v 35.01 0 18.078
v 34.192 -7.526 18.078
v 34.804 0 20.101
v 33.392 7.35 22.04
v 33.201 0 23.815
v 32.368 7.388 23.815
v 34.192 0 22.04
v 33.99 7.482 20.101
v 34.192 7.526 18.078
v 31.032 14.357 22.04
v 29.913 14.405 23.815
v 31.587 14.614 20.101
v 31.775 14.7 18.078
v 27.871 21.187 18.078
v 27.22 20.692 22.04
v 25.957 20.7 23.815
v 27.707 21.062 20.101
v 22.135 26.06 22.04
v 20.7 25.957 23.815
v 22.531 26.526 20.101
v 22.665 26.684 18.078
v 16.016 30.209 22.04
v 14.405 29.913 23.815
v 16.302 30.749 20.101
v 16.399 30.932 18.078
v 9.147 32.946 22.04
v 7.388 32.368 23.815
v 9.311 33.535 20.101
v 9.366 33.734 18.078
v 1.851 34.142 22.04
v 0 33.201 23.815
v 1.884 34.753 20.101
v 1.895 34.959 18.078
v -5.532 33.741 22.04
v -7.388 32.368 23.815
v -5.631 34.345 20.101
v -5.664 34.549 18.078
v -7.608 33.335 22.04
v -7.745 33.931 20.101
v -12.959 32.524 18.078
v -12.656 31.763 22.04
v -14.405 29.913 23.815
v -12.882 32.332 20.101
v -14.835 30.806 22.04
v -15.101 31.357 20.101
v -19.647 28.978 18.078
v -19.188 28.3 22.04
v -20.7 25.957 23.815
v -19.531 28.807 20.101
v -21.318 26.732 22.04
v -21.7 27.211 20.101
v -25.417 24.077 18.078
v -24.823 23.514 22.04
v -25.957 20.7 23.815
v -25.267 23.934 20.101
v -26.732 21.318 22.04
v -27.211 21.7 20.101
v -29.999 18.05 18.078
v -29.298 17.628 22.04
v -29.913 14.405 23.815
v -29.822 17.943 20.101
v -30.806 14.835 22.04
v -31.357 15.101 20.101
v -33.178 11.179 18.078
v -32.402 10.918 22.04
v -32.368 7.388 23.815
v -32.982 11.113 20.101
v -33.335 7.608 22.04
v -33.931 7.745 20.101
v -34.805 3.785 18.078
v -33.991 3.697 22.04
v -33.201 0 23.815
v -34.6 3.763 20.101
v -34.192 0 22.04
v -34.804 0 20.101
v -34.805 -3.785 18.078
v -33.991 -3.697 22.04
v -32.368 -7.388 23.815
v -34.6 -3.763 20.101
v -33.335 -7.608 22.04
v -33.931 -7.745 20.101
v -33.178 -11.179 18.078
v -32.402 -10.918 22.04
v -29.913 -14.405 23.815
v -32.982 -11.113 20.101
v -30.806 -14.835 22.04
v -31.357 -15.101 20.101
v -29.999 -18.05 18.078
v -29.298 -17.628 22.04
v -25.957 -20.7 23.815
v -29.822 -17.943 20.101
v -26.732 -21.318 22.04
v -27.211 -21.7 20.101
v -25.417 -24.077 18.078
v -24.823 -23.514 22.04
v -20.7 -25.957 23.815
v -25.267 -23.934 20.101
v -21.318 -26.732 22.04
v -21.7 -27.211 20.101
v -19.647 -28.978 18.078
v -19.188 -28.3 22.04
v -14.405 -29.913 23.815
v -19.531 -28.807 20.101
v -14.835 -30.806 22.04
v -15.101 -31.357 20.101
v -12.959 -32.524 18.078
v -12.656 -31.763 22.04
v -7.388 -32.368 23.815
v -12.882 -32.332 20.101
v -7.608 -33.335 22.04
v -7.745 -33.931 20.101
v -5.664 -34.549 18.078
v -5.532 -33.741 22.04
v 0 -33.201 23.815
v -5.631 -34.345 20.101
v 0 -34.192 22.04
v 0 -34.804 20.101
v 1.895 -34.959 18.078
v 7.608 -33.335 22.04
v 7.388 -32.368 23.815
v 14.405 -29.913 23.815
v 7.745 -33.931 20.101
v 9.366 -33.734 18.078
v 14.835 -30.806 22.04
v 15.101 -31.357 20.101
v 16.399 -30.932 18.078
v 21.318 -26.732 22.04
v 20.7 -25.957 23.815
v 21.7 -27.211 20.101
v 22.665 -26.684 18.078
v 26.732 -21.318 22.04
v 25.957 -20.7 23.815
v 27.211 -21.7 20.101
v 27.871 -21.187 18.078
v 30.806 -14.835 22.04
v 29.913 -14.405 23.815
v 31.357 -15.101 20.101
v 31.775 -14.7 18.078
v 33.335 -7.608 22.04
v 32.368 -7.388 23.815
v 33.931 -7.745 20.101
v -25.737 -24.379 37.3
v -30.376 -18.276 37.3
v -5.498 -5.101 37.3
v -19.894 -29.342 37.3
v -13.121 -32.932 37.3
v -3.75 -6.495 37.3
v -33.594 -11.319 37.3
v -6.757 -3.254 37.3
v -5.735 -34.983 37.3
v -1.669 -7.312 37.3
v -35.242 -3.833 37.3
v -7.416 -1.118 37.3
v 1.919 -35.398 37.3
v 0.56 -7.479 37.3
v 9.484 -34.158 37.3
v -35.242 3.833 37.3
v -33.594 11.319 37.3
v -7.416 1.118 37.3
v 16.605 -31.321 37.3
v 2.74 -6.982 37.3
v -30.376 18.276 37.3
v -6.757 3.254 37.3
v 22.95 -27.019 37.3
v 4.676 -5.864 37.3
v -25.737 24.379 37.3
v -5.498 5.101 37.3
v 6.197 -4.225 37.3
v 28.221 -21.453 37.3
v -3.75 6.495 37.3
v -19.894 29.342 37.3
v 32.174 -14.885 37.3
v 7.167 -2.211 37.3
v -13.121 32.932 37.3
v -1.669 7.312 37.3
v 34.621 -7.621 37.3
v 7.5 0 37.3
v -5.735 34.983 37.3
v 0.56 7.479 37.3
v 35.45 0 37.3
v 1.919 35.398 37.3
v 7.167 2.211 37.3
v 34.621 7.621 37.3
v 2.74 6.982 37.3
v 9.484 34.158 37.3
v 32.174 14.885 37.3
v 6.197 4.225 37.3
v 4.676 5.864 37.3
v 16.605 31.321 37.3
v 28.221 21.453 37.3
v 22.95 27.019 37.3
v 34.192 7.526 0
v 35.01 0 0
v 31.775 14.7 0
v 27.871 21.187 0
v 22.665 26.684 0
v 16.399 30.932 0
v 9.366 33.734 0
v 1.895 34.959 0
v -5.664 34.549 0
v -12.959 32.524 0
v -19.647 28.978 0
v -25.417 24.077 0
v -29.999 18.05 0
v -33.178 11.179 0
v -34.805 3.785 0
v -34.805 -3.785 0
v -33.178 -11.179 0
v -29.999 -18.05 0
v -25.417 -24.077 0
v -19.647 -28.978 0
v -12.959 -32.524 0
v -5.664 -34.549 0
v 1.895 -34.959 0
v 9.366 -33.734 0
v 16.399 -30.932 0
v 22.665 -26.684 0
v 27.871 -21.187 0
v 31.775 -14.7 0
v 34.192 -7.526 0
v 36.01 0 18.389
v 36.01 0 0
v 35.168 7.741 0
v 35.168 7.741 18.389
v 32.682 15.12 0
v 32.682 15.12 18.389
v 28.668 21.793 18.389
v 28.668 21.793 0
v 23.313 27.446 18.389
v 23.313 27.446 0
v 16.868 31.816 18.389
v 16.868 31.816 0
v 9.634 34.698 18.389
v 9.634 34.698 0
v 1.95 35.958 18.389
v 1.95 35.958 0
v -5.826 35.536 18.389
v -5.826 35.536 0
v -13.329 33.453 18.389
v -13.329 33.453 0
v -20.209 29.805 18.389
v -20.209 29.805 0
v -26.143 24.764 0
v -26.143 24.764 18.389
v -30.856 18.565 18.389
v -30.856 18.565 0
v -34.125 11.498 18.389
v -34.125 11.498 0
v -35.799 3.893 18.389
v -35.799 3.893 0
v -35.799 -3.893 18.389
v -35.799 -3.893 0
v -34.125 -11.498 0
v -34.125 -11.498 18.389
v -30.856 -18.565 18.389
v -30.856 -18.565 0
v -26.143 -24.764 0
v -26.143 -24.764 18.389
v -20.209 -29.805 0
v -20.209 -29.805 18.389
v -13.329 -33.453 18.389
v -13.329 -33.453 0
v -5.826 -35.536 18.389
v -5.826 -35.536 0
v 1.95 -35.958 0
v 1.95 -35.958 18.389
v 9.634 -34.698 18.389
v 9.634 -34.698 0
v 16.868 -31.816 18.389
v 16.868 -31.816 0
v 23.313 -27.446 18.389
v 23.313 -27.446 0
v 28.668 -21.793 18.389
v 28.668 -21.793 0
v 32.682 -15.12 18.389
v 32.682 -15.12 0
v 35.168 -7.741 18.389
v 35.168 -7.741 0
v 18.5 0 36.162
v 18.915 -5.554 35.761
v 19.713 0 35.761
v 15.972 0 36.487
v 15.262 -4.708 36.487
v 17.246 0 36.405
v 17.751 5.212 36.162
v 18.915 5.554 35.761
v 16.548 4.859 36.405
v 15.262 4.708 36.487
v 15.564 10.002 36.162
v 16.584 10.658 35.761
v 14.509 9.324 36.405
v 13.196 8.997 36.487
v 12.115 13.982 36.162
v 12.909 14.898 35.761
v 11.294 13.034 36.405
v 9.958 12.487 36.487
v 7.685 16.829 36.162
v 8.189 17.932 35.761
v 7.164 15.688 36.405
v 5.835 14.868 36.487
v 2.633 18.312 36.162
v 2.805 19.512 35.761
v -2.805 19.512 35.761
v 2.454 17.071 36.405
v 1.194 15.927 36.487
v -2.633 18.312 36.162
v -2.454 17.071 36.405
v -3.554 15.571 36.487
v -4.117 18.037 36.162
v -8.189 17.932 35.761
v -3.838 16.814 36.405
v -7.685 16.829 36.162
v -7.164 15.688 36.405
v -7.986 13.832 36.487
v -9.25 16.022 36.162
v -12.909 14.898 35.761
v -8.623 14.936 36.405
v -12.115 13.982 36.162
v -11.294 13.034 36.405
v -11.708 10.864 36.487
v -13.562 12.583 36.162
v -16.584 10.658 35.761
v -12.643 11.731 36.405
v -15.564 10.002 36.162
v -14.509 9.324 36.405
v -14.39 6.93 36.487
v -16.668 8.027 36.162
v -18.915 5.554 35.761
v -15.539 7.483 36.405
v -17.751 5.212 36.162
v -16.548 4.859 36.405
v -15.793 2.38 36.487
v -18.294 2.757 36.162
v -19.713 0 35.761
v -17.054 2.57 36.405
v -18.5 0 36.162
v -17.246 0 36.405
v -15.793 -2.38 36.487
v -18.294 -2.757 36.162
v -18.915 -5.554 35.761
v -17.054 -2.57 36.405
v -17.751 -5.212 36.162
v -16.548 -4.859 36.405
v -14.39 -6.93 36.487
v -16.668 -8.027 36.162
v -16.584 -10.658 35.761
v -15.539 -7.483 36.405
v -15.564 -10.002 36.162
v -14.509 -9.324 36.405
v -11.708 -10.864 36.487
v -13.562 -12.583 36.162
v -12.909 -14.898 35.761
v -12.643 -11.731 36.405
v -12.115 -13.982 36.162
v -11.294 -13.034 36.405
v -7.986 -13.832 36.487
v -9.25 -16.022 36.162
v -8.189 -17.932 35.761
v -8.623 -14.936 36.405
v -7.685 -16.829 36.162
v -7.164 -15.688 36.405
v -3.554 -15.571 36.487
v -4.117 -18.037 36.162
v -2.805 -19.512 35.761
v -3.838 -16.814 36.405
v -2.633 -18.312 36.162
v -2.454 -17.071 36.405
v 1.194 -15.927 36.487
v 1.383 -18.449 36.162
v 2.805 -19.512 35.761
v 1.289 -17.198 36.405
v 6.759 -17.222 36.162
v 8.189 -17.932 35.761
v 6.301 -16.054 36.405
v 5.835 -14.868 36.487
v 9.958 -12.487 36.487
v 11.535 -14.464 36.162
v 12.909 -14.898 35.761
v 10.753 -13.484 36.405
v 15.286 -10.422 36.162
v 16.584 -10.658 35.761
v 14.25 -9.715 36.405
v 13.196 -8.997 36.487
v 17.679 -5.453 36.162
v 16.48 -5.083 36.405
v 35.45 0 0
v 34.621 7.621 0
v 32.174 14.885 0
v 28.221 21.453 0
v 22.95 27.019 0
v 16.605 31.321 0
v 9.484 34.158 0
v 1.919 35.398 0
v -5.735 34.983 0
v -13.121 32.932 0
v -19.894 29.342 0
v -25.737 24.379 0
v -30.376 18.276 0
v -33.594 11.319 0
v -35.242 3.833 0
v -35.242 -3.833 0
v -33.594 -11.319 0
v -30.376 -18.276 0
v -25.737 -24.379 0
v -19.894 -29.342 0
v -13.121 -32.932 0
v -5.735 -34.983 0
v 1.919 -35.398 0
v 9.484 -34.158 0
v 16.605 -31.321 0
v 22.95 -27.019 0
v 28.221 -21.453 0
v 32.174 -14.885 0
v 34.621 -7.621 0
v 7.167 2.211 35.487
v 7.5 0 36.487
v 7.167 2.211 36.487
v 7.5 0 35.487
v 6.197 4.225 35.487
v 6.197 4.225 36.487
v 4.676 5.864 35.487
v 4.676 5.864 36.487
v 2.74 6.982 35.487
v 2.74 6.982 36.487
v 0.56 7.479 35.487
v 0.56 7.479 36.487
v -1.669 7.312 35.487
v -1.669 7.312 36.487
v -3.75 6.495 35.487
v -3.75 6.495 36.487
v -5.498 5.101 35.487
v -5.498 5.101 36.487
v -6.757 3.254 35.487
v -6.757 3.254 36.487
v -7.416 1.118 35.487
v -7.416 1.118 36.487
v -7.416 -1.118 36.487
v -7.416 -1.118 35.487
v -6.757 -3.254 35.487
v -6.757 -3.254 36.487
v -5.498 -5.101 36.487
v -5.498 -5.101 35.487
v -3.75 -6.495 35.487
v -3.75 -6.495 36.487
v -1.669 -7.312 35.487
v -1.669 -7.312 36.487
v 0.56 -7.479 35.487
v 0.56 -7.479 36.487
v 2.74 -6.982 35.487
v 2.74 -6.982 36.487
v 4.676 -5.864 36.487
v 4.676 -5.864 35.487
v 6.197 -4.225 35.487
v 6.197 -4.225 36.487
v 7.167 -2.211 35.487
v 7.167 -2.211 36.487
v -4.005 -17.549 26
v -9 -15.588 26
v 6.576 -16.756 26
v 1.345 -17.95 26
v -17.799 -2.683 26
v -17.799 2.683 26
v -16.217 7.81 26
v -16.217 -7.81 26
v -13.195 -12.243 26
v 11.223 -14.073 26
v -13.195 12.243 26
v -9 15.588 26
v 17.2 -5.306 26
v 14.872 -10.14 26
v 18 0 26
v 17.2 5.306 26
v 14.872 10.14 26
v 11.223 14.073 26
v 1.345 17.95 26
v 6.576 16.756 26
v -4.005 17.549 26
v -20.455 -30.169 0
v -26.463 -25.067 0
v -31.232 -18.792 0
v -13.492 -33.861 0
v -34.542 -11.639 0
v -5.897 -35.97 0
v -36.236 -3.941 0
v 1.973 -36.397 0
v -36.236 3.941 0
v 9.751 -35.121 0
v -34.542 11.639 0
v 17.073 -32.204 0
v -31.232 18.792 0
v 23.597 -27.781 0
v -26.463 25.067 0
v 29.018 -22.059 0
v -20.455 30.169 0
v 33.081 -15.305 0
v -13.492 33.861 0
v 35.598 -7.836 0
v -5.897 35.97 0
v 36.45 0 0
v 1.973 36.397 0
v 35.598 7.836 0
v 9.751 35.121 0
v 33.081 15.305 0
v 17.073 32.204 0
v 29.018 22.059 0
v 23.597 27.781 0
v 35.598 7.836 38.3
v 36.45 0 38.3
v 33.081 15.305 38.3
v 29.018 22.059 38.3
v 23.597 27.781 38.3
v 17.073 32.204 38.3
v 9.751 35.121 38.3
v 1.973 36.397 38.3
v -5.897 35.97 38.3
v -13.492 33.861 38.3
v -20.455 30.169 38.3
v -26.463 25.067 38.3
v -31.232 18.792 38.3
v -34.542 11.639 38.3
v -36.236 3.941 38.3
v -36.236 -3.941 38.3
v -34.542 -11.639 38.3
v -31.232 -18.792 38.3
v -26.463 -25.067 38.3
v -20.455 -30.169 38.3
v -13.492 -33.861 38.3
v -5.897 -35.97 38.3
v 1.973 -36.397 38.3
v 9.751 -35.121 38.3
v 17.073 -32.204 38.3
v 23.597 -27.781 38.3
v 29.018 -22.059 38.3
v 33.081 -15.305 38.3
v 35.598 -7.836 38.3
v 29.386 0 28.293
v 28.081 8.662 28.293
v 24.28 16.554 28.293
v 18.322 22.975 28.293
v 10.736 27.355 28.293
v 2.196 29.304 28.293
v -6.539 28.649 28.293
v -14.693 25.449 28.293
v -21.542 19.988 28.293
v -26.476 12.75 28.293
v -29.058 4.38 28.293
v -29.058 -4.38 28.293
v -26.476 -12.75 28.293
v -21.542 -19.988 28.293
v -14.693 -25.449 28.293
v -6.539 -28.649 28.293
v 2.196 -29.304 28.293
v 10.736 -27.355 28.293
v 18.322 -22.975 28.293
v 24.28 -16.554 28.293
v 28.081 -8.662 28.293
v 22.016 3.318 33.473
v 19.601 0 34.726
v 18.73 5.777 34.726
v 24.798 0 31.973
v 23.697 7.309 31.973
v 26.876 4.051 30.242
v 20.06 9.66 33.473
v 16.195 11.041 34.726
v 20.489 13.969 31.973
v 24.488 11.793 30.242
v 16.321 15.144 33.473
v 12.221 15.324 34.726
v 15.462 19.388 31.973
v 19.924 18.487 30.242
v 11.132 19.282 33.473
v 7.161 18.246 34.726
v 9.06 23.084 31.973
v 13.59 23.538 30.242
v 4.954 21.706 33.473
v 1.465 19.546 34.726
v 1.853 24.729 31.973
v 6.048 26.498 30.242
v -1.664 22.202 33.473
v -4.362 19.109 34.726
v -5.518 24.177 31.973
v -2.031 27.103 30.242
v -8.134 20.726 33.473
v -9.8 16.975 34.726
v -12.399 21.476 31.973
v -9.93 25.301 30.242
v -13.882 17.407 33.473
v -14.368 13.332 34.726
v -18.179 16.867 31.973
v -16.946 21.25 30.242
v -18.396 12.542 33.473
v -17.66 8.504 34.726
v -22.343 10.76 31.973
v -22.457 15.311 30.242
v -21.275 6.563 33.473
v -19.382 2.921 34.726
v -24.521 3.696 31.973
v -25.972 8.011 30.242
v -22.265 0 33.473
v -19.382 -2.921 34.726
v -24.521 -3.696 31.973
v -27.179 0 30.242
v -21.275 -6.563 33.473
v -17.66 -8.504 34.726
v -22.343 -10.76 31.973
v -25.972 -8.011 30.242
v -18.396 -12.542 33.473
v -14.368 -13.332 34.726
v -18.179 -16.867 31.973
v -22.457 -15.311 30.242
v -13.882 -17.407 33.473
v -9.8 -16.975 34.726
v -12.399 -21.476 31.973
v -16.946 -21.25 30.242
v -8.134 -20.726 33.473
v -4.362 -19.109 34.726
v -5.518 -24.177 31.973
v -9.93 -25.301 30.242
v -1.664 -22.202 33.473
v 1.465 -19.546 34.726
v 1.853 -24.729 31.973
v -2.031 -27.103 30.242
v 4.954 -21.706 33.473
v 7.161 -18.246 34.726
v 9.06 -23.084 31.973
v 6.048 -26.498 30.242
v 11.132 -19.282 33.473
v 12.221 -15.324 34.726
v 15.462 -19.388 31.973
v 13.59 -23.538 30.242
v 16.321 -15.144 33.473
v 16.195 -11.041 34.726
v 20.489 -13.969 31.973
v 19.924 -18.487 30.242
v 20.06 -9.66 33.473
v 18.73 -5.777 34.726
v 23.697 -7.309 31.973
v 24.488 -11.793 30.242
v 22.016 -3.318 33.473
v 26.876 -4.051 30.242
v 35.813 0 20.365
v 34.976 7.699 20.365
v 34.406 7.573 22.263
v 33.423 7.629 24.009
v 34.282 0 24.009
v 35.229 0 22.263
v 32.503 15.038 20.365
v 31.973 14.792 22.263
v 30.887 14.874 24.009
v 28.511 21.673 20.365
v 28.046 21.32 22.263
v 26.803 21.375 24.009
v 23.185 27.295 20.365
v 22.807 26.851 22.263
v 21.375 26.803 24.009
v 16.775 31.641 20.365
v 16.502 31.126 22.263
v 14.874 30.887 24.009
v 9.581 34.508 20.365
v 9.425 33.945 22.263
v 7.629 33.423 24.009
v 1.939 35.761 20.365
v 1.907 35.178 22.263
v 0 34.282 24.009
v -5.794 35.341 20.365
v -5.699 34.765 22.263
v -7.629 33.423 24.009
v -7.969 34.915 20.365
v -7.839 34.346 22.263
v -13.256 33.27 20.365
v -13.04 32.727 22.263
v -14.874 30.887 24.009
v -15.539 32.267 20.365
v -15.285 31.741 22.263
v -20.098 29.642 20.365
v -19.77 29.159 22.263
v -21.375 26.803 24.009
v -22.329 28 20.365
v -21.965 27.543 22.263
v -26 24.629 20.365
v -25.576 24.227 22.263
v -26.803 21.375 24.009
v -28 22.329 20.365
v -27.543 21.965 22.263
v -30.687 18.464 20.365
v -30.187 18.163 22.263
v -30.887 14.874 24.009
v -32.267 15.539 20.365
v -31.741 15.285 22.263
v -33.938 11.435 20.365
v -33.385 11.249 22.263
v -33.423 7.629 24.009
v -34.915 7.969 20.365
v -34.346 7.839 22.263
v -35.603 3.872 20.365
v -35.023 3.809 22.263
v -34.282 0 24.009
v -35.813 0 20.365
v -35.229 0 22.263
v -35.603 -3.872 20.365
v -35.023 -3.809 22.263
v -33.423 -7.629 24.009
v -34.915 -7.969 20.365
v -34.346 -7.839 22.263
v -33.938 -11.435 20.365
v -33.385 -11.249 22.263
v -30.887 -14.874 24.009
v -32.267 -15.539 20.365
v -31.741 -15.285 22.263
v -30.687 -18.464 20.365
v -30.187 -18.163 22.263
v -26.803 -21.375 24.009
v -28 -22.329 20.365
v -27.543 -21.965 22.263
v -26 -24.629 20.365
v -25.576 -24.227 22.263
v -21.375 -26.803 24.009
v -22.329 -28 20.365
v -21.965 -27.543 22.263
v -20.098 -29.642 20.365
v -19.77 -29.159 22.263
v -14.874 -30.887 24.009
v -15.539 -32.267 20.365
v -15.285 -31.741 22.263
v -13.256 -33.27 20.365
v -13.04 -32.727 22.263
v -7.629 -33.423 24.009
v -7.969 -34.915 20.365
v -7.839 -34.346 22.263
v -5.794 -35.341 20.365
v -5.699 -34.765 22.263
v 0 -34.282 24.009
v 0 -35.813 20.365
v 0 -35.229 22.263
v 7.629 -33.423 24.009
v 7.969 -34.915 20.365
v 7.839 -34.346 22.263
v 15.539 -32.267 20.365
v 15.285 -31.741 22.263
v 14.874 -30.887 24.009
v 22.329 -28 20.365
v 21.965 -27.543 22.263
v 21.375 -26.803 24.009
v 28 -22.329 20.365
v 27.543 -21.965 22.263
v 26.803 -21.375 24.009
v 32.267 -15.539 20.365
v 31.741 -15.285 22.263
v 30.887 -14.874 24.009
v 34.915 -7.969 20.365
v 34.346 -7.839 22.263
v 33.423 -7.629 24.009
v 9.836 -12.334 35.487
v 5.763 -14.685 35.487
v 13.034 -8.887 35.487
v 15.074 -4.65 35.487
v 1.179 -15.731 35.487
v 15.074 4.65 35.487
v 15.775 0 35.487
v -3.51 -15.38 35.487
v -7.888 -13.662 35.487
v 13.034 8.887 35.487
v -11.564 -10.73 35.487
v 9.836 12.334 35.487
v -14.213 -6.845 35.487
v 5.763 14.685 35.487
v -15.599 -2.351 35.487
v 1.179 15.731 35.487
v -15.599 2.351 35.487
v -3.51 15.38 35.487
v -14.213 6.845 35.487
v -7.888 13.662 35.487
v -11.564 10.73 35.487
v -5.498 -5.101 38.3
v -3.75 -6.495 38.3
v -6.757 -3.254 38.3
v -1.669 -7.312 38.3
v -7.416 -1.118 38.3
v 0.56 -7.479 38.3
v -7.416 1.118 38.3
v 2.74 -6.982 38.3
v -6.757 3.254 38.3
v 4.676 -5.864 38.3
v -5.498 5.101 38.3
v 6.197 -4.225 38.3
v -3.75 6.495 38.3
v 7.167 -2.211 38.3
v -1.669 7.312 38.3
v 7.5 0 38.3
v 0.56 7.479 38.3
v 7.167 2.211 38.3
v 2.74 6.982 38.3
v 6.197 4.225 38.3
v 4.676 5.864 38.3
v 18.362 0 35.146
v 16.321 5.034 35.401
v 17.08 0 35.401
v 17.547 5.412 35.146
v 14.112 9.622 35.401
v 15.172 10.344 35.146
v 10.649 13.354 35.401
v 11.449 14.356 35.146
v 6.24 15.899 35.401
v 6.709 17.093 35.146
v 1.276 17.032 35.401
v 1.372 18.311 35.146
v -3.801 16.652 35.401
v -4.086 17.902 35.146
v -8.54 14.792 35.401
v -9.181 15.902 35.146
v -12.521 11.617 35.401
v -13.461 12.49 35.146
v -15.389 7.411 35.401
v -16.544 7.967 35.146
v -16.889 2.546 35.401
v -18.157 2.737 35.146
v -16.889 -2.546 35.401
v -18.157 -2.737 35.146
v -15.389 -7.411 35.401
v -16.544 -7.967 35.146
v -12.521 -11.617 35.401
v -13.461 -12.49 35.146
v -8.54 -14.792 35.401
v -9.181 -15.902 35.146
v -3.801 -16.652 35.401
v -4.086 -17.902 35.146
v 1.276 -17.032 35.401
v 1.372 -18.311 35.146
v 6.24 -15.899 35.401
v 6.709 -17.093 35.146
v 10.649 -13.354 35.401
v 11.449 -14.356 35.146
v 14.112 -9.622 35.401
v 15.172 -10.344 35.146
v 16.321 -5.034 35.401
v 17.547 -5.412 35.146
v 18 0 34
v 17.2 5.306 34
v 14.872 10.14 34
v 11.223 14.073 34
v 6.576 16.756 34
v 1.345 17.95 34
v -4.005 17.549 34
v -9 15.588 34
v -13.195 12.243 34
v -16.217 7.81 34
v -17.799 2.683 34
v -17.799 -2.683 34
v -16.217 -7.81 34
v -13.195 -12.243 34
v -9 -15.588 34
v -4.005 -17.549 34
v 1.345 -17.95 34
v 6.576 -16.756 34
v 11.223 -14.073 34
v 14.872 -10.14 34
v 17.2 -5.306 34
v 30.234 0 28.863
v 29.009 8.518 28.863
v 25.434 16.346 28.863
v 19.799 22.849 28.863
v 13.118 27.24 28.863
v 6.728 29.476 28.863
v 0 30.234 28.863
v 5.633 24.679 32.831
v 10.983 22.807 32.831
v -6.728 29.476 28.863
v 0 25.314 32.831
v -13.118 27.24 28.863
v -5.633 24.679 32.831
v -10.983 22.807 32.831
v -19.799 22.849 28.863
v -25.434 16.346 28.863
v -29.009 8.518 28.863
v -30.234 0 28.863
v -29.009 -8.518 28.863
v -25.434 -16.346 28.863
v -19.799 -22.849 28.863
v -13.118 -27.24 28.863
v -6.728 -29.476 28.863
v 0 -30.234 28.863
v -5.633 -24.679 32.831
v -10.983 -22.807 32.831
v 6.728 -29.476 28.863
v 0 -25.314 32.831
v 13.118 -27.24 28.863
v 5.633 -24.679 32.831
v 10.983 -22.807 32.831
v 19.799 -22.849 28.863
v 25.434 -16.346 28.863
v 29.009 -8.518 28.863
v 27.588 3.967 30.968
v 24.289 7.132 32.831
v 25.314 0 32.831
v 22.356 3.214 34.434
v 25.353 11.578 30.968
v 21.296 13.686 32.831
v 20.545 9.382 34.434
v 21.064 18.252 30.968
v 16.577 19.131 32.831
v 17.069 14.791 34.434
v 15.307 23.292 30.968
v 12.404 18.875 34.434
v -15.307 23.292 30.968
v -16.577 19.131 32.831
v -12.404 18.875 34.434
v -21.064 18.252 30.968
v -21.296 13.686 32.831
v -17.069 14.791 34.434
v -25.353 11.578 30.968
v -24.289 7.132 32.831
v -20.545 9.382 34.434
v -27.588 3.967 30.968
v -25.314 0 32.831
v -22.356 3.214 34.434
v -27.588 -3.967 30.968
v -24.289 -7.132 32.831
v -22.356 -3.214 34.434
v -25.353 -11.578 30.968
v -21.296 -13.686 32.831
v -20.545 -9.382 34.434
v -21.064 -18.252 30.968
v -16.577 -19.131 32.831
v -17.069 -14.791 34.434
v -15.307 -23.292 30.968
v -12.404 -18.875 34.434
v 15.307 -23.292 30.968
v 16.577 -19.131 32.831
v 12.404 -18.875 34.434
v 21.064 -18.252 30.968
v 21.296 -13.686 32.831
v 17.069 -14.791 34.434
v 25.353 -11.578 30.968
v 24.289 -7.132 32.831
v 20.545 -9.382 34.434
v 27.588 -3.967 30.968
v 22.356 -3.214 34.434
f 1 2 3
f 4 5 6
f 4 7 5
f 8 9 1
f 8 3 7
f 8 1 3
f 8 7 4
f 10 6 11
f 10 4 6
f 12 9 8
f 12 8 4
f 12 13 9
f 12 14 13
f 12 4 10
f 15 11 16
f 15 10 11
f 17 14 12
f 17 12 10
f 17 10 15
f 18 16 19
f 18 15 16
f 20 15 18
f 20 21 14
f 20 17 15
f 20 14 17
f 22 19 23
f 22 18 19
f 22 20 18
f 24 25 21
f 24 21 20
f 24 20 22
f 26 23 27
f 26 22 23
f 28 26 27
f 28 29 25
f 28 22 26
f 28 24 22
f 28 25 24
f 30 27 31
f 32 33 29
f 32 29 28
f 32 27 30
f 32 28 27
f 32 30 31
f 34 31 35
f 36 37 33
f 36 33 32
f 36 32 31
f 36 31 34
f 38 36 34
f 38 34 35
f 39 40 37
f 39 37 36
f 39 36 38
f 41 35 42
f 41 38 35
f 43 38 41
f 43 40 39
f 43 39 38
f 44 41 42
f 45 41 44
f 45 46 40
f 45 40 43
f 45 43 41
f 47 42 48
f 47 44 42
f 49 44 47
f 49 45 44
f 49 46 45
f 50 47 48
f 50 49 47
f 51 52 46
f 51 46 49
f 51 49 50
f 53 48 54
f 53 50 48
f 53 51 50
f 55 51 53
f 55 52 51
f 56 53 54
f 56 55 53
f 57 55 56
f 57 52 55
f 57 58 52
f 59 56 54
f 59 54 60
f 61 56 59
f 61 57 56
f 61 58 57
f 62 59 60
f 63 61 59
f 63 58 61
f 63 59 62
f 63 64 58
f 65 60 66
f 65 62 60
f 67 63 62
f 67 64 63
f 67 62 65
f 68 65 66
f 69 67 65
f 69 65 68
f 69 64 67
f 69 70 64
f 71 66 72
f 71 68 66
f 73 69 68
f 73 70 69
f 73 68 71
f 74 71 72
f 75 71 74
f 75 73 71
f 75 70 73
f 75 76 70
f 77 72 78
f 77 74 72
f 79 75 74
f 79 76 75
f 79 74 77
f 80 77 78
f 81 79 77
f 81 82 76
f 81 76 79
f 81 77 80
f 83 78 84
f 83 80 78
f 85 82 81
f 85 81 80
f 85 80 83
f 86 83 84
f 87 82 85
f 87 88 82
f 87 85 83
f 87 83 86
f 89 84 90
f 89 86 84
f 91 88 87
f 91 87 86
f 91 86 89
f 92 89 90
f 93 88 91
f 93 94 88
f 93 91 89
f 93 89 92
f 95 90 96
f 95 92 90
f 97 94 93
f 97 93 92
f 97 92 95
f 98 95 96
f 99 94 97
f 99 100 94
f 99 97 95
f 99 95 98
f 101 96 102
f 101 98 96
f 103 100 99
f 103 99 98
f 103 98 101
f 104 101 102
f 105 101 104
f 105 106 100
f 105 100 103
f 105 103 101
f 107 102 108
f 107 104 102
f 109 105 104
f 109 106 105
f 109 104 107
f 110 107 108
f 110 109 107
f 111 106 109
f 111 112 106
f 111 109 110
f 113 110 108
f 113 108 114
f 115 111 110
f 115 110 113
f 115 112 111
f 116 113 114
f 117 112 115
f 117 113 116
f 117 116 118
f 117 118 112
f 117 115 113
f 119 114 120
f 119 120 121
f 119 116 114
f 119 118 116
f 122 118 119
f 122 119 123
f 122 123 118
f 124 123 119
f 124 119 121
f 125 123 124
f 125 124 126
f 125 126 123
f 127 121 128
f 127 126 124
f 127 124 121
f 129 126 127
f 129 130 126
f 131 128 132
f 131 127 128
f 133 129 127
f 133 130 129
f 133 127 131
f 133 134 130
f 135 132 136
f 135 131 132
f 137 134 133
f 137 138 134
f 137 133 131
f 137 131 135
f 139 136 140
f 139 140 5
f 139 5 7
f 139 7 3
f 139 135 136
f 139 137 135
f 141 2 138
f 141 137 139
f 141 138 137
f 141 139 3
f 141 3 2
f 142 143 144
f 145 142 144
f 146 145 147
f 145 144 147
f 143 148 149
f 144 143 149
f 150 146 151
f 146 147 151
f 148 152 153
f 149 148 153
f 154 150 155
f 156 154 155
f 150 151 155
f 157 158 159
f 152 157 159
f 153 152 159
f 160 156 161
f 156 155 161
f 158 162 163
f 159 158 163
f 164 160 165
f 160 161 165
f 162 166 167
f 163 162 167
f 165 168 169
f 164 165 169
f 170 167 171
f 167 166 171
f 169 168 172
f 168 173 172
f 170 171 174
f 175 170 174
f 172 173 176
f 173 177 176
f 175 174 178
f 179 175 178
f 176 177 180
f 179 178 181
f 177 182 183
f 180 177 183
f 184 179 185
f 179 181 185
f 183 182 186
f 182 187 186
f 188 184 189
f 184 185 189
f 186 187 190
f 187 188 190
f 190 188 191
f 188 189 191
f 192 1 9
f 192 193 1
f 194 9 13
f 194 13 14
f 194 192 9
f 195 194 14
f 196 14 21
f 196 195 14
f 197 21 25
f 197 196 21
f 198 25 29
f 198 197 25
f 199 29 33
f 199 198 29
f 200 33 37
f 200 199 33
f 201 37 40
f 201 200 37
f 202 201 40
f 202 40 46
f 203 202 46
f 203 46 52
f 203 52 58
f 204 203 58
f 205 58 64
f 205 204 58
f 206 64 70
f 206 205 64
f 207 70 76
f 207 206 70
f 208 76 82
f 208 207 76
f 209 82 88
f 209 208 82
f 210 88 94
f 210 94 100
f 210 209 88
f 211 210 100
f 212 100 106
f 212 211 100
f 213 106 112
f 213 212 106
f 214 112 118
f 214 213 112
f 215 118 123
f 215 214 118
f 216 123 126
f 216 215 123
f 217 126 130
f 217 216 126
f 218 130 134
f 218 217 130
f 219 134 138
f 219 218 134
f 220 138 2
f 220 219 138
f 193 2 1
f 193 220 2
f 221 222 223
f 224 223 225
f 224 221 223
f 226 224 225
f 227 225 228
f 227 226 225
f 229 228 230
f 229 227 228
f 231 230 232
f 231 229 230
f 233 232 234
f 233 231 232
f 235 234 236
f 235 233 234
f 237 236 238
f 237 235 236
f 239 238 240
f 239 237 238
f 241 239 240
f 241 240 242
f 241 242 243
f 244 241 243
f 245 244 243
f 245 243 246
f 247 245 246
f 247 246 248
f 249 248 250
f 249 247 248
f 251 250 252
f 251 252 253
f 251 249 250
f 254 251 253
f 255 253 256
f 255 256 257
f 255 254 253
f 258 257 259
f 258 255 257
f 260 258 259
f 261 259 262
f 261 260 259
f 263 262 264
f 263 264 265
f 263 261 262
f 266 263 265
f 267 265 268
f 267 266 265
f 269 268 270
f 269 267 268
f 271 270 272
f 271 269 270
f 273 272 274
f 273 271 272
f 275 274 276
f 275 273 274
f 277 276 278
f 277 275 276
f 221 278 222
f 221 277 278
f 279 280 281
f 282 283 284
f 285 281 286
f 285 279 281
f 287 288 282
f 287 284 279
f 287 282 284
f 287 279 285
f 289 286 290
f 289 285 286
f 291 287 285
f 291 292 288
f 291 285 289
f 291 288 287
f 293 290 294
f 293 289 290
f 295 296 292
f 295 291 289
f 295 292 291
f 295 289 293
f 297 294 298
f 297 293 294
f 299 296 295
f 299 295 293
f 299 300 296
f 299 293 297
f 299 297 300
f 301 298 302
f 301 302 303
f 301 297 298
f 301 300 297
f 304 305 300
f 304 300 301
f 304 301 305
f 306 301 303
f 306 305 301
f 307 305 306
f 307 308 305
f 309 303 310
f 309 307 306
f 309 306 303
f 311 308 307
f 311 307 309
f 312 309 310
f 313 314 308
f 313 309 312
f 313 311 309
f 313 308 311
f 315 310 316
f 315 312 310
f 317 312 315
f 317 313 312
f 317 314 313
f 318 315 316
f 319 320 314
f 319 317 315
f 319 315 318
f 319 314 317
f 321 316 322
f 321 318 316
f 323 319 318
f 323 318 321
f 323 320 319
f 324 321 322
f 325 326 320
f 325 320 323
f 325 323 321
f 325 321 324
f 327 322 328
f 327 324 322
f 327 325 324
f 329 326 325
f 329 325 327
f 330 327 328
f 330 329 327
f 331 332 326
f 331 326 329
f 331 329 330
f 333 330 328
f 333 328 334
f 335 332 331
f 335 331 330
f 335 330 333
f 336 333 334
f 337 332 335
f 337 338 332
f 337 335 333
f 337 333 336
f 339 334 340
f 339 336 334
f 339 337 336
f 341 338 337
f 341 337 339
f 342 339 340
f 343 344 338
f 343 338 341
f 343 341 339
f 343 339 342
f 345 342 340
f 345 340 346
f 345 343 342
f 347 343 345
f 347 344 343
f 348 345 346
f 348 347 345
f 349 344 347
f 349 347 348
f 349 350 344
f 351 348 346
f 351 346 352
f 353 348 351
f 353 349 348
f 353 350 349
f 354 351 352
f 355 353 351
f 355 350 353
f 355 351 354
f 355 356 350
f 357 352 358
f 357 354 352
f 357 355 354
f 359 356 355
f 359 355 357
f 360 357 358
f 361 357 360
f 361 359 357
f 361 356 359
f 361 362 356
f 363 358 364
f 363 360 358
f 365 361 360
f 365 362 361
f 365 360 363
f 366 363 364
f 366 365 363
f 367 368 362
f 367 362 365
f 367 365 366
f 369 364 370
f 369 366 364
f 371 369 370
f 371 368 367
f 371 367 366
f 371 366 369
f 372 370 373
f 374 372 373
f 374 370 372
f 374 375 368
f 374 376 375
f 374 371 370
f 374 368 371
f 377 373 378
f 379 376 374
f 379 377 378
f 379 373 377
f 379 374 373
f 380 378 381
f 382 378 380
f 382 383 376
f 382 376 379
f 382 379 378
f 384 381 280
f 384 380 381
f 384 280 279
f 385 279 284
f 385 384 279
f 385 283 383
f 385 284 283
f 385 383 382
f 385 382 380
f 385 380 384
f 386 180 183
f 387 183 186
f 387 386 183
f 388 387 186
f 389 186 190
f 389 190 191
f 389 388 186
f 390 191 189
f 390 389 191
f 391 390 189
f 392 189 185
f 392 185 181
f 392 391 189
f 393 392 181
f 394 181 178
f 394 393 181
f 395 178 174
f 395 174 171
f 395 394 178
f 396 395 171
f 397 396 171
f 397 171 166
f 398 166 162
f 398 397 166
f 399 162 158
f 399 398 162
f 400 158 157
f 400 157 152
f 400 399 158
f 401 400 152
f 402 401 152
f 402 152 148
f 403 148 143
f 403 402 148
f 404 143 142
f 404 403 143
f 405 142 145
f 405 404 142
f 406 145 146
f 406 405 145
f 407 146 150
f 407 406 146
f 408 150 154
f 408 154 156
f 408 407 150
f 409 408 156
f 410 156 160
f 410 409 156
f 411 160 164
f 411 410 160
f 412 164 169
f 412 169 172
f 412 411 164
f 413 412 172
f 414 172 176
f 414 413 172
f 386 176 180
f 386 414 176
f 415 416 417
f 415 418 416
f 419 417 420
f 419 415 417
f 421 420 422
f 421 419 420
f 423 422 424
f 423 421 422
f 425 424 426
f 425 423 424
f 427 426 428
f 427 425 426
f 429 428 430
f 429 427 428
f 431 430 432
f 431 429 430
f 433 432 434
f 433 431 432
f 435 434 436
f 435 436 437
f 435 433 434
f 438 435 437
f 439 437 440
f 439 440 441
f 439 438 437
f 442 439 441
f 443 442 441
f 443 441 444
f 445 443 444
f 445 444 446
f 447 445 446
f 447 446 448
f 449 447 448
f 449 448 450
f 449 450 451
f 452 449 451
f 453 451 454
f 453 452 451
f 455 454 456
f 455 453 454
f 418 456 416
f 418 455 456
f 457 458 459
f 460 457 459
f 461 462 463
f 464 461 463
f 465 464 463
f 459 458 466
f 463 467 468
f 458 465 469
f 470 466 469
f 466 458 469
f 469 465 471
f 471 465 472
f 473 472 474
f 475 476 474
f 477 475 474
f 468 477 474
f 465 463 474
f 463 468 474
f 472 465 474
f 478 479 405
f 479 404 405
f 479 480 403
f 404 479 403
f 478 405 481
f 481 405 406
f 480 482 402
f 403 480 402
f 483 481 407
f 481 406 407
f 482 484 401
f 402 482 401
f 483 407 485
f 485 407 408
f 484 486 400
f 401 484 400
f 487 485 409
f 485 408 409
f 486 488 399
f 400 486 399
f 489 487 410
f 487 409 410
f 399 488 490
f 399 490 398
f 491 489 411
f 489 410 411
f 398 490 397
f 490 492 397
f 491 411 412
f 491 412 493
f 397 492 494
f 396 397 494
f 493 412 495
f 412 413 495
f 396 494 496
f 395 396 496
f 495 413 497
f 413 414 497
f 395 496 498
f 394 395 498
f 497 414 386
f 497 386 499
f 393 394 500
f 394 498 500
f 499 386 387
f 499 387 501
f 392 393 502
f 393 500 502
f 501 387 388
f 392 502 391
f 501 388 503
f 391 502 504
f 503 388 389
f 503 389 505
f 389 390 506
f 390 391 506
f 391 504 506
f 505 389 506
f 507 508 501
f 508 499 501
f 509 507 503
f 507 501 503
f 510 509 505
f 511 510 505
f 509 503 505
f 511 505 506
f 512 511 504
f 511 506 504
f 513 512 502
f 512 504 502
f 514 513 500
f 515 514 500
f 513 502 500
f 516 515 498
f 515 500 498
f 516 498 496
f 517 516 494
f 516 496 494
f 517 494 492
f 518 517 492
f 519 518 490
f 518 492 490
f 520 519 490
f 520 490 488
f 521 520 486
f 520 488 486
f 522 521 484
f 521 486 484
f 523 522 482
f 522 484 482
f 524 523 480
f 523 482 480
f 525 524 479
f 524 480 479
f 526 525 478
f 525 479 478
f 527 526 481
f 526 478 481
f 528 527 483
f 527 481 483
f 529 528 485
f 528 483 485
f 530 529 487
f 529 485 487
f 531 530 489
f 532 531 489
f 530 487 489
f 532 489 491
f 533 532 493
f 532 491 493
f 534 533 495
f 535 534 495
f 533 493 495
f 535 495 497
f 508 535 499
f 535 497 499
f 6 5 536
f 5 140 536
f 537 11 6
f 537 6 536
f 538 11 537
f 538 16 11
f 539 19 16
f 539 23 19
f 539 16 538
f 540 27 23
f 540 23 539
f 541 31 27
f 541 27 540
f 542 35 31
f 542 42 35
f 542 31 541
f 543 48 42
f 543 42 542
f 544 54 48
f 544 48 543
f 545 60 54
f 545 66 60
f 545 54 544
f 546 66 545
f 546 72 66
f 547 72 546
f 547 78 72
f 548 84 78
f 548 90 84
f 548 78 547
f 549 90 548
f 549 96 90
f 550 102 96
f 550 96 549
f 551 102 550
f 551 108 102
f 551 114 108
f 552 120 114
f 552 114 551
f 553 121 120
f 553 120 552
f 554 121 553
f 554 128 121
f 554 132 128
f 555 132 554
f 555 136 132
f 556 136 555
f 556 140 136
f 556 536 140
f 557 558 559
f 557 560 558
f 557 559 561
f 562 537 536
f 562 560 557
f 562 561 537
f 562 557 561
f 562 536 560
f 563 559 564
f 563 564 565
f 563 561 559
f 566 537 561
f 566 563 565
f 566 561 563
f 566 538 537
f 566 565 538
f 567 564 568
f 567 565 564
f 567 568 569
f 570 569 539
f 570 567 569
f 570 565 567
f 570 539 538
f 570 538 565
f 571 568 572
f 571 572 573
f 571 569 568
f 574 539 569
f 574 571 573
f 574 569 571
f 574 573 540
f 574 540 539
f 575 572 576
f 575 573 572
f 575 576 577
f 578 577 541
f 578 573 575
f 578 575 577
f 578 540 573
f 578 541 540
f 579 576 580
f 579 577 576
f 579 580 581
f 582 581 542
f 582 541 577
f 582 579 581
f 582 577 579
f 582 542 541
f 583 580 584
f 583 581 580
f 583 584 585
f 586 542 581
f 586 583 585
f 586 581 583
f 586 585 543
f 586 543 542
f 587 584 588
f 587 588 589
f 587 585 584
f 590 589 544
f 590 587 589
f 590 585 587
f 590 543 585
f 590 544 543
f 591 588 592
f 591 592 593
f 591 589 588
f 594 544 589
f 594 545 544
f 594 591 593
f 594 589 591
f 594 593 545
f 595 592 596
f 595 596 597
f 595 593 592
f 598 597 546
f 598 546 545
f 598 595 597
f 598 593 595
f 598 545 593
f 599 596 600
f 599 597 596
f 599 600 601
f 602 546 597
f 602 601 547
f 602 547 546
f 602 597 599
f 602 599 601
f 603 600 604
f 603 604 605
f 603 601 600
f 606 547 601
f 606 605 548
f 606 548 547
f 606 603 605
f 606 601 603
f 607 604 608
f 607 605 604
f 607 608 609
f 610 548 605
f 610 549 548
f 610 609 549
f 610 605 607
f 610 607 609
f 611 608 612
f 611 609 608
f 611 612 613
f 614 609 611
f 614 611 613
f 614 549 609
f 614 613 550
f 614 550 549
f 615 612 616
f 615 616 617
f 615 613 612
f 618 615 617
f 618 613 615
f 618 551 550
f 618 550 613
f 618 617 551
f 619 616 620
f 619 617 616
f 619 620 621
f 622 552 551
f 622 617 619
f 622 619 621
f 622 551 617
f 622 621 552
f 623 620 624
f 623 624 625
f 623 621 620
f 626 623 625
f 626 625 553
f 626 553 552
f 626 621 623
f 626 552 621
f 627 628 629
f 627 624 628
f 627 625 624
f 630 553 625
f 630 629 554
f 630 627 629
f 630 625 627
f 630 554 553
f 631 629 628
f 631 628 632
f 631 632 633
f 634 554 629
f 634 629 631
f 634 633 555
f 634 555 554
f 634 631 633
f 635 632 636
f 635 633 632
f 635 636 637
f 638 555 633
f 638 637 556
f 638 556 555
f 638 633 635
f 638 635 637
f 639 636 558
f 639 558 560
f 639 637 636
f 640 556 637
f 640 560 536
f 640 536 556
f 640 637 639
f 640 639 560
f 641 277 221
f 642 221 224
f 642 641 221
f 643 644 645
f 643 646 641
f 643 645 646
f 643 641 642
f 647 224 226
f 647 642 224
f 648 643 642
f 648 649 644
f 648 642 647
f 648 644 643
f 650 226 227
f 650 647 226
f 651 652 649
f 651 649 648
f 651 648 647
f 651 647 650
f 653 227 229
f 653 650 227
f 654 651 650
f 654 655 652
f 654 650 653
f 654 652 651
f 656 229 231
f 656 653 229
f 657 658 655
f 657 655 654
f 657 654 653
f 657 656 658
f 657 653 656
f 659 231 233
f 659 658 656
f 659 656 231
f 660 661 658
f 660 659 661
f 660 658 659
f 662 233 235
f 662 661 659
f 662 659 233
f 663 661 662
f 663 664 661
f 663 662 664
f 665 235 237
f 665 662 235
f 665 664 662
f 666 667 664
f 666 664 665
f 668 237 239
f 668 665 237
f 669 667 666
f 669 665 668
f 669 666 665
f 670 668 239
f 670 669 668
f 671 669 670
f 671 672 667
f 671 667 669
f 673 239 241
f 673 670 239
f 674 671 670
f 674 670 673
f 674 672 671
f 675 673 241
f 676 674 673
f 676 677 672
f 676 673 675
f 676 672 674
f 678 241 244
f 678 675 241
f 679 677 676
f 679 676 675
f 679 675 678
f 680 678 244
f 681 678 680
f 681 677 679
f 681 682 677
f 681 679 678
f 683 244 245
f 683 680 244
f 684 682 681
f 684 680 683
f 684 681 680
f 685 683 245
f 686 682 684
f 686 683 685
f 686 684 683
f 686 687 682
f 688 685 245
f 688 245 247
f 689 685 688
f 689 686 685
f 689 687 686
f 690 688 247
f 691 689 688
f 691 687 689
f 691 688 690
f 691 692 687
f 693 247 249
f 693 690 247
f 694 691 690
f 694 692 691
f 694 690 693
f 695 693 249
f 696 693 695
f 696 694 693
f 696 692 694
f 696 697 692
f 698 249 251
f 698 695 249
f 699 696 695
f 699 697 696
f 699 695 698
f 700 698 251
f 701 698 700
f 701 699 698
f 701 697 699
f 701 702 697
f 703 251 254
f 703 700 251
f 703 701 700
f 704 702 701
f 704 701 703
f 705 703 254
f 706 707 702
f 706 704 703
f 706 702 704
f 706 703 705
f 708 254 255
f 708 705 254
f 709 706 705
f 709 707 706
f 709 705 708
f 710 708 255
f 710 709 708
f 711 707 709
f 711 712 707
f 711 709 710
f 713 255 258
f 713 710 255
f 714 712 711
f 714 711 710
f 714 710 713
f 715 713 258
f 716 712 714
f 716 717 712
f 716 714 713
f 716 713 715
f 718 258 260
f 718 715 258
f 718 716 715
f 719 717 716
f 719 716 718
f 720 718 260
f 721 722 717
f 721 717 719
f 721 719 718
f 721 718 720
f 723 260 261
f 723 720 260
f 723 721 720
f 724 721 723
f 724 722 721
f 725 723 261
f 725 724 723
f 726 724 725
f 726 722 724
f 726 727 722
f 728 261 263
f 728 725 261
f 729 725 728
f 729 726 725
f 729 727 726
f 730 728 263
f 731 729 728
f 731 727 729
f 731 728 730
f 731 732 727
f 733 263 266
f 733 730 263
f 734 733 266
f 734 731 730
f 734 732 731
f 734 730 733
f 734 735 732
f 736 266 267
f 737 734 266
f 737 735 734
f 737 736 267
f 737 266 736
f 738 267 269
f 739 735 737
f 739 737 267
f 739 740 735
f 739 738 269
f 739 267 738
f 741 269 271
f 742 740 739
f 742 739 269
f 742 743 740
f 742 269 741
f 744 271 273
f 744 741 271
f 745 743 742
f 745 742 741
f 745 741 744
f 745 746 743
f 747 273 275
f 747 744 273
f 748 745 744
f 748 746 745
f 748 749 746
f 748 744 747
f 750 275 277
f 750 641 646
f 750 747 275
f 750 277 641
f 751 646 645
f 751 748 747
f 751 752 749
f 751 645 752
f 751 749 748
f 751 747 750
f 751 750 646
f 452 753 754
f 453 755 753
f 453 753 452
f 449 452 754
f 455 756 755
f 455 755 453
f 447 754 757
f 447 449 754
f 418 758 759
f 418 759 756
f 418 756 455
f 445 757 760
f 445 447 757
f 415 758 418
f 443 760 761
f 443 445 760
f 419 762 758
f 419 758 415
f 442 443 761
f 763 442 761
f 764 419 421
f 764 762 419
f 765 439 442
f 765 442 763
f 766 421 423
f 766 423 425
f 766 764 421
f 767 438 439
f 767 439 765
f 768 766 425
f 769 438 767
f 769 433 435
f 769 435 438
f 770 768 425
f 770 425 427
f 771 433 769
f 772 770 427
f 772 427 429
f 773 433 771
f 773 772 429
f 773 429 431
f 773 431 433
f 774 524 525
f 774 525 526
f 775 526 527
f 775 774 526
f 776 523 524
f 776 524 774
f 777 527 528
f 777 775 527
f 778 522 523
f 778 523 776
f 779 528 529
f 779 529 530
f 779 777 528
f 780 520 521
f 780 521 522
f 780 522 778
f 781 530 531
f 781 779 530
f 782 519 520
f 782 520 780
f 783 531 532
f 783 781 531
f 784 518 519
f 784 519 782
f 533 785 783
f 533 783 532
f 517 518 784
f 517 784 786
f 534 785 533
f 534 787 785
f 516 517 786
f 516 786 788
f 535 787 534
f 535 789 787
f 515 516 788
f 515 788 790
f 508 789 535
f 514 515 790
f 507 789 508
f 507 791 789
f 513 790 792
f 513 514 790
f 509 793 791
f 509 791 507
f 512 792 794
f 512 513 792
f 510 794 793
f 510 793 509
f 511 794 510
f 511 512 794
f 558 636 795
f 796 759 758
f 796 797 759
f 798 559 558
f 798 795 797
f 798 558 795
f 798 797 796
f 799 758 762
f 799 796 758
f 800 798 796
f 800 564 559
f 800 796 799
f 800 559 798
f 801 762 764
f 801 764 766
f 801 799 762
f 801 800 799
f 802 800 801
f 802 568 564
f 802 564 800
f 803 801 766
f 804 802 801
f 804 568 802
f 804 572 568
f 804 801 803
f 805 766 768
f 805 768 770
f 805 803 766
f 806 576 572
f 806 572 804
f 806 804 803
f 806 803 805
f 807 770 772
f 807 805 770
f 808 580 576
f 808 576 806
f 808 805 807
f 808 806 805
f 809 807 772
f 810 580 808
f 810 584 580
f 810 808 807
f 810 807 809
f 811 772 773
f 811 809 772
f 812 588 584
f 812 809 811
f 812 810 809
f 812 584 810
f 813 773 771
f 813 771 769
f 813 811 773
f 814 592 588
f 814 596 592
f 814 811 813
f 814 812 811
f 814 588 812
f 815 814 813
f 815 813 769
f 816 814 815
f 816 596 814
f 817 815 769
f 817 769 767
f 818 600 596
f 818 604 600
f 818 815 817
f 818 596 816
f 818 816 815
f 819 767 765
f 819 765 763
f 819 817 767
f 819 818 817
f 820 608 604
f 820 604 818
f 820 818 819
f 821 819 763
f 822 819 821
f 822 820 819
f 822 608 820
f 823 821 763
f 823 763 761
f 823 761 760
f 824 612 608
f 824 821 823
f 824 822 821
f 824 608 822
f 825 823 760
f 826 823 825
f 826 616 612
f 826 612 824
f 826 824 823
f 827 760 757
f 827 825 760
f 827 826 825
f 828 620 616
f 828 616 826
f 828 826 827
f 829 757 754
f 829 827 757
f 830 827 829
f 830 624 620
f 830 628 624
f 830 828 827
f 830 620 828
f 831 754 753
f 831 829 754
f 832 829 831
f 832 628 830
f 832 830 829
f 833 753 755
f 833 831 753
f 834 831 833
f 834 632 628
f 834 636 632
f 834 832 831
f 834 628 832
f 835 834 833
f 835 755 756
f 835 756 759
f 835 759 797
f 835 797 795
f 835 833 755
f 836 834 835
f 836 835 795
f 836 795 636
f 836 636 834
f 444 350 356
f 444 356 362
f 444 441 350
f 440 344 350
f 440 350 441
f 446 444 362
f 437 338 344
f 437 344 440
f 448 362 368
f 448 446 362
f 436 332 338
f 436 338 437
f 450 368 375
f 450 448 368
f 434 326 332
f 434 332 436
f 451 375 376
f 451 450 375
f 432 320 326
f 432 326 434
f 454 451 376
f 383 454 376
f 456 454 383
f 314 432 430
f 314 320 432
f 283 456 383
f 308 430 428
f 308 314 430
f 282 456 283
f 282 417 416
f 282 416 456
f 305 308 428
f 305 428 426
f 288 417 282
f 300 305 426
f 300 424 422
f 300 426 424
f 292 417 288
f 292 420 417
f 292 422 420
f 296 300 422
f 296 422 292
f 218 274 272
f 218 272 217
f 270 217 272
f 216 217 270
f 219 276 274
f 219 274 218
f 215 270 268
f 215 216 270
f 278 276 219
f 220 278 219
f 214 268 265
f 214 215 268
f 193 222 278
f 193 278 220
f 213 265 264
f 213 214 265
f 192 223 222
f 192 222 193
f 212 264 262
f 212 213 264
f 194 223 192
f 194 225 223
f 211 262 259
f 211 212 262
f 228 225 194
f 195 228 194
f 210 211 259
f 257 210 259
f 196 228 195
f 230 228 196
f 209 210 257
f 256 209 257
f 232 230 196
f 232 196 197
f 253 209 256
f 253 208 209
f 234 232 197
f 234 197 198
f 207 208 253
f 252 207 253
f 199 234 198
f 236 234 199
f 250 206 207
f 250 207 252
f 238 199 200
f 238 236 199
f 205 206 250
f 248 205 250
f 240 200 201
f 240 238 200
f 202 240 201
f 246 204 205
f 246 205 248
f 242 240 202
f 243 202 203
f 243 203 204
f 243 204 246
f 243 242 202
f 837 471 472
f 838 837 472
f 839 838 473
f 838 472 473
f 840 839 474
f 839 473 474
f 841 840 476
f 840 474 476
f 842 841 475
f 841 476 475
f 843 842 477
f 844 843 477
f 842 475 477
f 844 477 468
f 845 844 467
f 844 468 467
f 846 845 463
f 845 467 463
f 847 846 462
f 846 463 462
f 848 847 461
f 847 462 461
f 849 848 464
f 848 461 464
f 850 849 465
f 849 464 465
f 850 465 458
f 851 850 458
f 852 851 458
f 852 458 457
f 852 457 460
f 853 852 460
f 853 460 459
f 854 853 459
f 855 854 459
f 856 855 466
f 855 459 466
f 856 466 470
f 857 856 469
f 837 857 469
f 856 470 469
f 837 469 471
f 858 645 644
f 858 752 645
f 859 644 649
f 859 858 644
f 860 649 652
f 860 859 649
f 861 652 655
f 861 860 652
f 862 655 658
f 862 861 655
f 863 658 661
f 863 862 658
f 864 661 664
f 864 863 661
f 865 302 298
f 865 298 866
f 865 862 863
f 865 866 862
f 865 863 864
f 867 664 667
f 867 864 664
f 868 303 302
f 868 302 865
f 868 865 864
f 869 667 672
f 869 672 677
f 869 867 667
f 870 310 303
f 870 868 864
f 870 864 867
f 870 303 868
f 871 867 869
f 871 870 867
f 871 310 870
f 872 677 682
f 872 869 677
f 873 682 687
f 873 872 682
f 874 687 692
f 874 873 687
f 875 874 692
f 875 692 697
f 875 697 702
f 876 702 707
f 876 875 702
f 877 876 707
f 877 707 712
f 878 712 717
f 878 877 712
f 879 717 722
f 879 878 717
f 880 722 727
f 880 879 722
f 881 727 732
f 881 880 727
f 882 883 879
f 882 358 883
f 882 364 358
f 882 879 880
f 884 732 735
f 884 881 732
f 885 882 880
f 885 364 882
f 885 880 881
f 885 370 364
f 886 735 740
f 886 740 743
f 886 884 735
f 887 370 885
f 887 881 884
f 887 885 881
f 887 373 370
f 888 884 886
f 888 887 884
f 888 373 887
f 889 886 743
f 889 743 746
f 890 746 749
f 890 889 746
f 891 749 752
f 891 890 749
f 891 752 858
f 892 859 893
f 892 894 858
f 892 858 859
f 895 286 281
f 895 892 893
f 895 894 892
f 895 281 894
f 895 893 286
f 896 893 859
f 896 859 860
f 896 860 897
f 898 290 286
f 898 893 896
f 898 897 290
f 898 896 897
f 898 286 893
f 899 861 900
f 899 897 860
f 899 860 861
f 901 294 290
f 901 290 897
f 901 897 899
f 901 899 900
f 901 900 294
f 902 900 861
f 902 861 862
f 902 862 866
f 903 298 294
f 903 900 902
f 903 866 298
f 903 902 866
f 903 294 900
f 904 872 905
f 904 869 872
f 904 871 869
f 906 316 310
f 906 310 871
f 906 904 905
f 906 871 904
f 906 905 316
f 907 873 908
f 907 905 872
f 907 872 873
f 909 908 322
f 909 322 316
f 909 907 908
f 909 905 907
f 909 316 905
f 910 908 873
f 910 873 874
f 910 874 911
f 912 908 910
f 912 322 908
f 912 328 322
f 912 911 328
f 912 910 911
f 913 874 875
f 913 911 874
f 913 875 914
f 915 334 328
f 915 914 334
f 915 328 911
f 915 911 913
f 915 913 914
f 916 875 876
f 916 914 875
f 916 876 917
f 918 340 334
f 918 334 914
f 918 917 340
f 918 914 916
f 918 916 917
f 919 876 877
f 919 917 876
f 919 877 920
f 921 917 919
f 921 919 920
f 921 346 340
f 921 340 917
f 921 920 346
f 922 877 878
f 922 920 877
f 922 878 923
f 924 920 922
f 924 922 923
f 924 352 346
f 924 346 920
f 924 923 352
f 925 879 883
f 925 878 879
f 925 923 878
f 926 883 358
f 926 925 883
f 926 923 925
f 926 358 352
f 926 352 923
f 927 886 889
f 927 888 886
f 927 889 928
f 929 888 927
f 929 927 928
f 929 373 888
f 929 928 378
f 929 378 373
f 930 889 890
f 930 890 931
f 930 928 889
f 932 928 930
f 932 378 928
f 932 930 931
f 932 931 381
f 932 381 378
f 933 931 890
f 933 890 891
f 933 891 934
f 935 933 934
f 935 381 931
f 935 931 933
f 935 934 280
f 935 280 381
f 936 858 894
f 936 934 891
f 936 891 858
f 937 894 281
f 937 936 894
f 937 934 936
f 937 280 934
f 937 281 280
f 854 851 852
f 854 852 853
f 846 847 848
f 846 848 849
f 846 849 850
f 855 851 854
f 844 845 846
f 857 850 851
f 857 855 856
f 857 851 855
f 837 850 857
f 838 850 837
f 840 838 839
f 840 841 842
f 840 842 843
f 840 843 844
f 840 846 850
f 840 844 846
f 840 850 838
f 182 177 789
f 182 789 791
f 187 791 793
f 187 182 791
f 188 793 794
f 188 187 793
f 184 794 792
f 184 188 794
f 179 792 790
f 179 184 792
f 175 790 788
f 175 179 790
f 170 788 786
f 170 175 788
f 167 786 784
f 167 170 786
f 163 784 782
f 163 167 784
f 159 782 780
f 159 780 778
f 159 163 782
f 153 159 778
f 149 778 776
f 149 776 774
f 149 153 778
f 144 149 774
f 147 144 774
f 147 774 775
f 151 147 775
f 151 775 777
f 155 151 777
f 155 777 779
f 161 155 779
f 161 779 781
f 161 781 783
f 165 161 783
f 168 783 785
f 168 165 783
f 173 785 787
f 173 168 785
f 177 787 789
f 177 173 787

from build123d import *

# Parameters (mm, degrees)
F7_R      = 18
F8_DEPTH  = 8
F5_R      = 36.45
F5_R_2    = 35.45
F9_DEPTH  = 37.3
F11_R     = 36.45
F11_R_2   = 7.5
F12_DEPTH = 1


with BuildPart() as f8:
    # F7 (on offset) → F8 (new body)
    with BuildSketch(Plane.XY.offset(26)):
        Circle(F7_R)
    extrude(amount=F8_DEPTH)


with BuildPart() as f9:
    # F5 (on Top) → F9 (new body)
    with BuildSketch(Plane.XY):
        Circle(F5_R)
        Circle(F5_R_2, mode=Mode.SUBTRACT)
    extrude(amount=F9_DEPTH)

    # F11 (on offset) → F12 (join)
    with BuildSketch(Plane.XY.offset(37.3)):
        Circle(F11_R)
        Circle(F11_R_2, mode=Mode.SUBTRACT)
    extrude(amount=F12_DEPTH)


with BuildPart() as f14:
    # F13 (on Front) → F14 (revolve)
    with BuildSketch(Plane.XZ):
        with BuildLine():
            Line((35.0103266537, 18.0778356203), (35.0103266537, 0))
            Line((35.0103266537, 0), (36.0103266537, 0))
            Line((36.0103266537, 0), (36.0103266537, 18.3892655566))
            ThreePointArc((36.0103266537, 18.3892655566), (35.5685388344, 21.3287518908), (34.2822106719, 24.0085123736))
            ThreePointArc((34.2822106719, 24.0085123736), (27.8716528349, 30.9680026182), (19.7131436366, 35.7605472353))
            ThreePointArc((19.7131436366, 35.7605472353), (17.8773552302, 36.3035819712), (15.9717253793, 36.4868322611))
            Line((15.9717253793, 36.4868322611), (7.5, 36.4868322611))
            Line((7.5, 36.4868322611), (7.5, 35.4868322611))
            Line((7.5, 35.4868322611), (15.7752775923, 35.4868322611))
            ThreePointArc((15.7752775923, 35.4868322611), (17.7254208899, 35.2948361925), (19.6006802182, 34.7262204849))
            ThreePointArc((19.6006802182, 34.7262204849), (27.1793473993, 30.2415196608), (33.2005339142, 23.815474946))
            ThreePointArc((33.2005339142, 23.815474946), (34.5471519275, 21.0859851674), (35.0103266537, 18.0778356203))
        make_face()
    revolve(axis=Axis((0, 0, 18.9236644655), (0, 0, 1)))


solid = Compound([f8.part, f9.part, f14.part])
